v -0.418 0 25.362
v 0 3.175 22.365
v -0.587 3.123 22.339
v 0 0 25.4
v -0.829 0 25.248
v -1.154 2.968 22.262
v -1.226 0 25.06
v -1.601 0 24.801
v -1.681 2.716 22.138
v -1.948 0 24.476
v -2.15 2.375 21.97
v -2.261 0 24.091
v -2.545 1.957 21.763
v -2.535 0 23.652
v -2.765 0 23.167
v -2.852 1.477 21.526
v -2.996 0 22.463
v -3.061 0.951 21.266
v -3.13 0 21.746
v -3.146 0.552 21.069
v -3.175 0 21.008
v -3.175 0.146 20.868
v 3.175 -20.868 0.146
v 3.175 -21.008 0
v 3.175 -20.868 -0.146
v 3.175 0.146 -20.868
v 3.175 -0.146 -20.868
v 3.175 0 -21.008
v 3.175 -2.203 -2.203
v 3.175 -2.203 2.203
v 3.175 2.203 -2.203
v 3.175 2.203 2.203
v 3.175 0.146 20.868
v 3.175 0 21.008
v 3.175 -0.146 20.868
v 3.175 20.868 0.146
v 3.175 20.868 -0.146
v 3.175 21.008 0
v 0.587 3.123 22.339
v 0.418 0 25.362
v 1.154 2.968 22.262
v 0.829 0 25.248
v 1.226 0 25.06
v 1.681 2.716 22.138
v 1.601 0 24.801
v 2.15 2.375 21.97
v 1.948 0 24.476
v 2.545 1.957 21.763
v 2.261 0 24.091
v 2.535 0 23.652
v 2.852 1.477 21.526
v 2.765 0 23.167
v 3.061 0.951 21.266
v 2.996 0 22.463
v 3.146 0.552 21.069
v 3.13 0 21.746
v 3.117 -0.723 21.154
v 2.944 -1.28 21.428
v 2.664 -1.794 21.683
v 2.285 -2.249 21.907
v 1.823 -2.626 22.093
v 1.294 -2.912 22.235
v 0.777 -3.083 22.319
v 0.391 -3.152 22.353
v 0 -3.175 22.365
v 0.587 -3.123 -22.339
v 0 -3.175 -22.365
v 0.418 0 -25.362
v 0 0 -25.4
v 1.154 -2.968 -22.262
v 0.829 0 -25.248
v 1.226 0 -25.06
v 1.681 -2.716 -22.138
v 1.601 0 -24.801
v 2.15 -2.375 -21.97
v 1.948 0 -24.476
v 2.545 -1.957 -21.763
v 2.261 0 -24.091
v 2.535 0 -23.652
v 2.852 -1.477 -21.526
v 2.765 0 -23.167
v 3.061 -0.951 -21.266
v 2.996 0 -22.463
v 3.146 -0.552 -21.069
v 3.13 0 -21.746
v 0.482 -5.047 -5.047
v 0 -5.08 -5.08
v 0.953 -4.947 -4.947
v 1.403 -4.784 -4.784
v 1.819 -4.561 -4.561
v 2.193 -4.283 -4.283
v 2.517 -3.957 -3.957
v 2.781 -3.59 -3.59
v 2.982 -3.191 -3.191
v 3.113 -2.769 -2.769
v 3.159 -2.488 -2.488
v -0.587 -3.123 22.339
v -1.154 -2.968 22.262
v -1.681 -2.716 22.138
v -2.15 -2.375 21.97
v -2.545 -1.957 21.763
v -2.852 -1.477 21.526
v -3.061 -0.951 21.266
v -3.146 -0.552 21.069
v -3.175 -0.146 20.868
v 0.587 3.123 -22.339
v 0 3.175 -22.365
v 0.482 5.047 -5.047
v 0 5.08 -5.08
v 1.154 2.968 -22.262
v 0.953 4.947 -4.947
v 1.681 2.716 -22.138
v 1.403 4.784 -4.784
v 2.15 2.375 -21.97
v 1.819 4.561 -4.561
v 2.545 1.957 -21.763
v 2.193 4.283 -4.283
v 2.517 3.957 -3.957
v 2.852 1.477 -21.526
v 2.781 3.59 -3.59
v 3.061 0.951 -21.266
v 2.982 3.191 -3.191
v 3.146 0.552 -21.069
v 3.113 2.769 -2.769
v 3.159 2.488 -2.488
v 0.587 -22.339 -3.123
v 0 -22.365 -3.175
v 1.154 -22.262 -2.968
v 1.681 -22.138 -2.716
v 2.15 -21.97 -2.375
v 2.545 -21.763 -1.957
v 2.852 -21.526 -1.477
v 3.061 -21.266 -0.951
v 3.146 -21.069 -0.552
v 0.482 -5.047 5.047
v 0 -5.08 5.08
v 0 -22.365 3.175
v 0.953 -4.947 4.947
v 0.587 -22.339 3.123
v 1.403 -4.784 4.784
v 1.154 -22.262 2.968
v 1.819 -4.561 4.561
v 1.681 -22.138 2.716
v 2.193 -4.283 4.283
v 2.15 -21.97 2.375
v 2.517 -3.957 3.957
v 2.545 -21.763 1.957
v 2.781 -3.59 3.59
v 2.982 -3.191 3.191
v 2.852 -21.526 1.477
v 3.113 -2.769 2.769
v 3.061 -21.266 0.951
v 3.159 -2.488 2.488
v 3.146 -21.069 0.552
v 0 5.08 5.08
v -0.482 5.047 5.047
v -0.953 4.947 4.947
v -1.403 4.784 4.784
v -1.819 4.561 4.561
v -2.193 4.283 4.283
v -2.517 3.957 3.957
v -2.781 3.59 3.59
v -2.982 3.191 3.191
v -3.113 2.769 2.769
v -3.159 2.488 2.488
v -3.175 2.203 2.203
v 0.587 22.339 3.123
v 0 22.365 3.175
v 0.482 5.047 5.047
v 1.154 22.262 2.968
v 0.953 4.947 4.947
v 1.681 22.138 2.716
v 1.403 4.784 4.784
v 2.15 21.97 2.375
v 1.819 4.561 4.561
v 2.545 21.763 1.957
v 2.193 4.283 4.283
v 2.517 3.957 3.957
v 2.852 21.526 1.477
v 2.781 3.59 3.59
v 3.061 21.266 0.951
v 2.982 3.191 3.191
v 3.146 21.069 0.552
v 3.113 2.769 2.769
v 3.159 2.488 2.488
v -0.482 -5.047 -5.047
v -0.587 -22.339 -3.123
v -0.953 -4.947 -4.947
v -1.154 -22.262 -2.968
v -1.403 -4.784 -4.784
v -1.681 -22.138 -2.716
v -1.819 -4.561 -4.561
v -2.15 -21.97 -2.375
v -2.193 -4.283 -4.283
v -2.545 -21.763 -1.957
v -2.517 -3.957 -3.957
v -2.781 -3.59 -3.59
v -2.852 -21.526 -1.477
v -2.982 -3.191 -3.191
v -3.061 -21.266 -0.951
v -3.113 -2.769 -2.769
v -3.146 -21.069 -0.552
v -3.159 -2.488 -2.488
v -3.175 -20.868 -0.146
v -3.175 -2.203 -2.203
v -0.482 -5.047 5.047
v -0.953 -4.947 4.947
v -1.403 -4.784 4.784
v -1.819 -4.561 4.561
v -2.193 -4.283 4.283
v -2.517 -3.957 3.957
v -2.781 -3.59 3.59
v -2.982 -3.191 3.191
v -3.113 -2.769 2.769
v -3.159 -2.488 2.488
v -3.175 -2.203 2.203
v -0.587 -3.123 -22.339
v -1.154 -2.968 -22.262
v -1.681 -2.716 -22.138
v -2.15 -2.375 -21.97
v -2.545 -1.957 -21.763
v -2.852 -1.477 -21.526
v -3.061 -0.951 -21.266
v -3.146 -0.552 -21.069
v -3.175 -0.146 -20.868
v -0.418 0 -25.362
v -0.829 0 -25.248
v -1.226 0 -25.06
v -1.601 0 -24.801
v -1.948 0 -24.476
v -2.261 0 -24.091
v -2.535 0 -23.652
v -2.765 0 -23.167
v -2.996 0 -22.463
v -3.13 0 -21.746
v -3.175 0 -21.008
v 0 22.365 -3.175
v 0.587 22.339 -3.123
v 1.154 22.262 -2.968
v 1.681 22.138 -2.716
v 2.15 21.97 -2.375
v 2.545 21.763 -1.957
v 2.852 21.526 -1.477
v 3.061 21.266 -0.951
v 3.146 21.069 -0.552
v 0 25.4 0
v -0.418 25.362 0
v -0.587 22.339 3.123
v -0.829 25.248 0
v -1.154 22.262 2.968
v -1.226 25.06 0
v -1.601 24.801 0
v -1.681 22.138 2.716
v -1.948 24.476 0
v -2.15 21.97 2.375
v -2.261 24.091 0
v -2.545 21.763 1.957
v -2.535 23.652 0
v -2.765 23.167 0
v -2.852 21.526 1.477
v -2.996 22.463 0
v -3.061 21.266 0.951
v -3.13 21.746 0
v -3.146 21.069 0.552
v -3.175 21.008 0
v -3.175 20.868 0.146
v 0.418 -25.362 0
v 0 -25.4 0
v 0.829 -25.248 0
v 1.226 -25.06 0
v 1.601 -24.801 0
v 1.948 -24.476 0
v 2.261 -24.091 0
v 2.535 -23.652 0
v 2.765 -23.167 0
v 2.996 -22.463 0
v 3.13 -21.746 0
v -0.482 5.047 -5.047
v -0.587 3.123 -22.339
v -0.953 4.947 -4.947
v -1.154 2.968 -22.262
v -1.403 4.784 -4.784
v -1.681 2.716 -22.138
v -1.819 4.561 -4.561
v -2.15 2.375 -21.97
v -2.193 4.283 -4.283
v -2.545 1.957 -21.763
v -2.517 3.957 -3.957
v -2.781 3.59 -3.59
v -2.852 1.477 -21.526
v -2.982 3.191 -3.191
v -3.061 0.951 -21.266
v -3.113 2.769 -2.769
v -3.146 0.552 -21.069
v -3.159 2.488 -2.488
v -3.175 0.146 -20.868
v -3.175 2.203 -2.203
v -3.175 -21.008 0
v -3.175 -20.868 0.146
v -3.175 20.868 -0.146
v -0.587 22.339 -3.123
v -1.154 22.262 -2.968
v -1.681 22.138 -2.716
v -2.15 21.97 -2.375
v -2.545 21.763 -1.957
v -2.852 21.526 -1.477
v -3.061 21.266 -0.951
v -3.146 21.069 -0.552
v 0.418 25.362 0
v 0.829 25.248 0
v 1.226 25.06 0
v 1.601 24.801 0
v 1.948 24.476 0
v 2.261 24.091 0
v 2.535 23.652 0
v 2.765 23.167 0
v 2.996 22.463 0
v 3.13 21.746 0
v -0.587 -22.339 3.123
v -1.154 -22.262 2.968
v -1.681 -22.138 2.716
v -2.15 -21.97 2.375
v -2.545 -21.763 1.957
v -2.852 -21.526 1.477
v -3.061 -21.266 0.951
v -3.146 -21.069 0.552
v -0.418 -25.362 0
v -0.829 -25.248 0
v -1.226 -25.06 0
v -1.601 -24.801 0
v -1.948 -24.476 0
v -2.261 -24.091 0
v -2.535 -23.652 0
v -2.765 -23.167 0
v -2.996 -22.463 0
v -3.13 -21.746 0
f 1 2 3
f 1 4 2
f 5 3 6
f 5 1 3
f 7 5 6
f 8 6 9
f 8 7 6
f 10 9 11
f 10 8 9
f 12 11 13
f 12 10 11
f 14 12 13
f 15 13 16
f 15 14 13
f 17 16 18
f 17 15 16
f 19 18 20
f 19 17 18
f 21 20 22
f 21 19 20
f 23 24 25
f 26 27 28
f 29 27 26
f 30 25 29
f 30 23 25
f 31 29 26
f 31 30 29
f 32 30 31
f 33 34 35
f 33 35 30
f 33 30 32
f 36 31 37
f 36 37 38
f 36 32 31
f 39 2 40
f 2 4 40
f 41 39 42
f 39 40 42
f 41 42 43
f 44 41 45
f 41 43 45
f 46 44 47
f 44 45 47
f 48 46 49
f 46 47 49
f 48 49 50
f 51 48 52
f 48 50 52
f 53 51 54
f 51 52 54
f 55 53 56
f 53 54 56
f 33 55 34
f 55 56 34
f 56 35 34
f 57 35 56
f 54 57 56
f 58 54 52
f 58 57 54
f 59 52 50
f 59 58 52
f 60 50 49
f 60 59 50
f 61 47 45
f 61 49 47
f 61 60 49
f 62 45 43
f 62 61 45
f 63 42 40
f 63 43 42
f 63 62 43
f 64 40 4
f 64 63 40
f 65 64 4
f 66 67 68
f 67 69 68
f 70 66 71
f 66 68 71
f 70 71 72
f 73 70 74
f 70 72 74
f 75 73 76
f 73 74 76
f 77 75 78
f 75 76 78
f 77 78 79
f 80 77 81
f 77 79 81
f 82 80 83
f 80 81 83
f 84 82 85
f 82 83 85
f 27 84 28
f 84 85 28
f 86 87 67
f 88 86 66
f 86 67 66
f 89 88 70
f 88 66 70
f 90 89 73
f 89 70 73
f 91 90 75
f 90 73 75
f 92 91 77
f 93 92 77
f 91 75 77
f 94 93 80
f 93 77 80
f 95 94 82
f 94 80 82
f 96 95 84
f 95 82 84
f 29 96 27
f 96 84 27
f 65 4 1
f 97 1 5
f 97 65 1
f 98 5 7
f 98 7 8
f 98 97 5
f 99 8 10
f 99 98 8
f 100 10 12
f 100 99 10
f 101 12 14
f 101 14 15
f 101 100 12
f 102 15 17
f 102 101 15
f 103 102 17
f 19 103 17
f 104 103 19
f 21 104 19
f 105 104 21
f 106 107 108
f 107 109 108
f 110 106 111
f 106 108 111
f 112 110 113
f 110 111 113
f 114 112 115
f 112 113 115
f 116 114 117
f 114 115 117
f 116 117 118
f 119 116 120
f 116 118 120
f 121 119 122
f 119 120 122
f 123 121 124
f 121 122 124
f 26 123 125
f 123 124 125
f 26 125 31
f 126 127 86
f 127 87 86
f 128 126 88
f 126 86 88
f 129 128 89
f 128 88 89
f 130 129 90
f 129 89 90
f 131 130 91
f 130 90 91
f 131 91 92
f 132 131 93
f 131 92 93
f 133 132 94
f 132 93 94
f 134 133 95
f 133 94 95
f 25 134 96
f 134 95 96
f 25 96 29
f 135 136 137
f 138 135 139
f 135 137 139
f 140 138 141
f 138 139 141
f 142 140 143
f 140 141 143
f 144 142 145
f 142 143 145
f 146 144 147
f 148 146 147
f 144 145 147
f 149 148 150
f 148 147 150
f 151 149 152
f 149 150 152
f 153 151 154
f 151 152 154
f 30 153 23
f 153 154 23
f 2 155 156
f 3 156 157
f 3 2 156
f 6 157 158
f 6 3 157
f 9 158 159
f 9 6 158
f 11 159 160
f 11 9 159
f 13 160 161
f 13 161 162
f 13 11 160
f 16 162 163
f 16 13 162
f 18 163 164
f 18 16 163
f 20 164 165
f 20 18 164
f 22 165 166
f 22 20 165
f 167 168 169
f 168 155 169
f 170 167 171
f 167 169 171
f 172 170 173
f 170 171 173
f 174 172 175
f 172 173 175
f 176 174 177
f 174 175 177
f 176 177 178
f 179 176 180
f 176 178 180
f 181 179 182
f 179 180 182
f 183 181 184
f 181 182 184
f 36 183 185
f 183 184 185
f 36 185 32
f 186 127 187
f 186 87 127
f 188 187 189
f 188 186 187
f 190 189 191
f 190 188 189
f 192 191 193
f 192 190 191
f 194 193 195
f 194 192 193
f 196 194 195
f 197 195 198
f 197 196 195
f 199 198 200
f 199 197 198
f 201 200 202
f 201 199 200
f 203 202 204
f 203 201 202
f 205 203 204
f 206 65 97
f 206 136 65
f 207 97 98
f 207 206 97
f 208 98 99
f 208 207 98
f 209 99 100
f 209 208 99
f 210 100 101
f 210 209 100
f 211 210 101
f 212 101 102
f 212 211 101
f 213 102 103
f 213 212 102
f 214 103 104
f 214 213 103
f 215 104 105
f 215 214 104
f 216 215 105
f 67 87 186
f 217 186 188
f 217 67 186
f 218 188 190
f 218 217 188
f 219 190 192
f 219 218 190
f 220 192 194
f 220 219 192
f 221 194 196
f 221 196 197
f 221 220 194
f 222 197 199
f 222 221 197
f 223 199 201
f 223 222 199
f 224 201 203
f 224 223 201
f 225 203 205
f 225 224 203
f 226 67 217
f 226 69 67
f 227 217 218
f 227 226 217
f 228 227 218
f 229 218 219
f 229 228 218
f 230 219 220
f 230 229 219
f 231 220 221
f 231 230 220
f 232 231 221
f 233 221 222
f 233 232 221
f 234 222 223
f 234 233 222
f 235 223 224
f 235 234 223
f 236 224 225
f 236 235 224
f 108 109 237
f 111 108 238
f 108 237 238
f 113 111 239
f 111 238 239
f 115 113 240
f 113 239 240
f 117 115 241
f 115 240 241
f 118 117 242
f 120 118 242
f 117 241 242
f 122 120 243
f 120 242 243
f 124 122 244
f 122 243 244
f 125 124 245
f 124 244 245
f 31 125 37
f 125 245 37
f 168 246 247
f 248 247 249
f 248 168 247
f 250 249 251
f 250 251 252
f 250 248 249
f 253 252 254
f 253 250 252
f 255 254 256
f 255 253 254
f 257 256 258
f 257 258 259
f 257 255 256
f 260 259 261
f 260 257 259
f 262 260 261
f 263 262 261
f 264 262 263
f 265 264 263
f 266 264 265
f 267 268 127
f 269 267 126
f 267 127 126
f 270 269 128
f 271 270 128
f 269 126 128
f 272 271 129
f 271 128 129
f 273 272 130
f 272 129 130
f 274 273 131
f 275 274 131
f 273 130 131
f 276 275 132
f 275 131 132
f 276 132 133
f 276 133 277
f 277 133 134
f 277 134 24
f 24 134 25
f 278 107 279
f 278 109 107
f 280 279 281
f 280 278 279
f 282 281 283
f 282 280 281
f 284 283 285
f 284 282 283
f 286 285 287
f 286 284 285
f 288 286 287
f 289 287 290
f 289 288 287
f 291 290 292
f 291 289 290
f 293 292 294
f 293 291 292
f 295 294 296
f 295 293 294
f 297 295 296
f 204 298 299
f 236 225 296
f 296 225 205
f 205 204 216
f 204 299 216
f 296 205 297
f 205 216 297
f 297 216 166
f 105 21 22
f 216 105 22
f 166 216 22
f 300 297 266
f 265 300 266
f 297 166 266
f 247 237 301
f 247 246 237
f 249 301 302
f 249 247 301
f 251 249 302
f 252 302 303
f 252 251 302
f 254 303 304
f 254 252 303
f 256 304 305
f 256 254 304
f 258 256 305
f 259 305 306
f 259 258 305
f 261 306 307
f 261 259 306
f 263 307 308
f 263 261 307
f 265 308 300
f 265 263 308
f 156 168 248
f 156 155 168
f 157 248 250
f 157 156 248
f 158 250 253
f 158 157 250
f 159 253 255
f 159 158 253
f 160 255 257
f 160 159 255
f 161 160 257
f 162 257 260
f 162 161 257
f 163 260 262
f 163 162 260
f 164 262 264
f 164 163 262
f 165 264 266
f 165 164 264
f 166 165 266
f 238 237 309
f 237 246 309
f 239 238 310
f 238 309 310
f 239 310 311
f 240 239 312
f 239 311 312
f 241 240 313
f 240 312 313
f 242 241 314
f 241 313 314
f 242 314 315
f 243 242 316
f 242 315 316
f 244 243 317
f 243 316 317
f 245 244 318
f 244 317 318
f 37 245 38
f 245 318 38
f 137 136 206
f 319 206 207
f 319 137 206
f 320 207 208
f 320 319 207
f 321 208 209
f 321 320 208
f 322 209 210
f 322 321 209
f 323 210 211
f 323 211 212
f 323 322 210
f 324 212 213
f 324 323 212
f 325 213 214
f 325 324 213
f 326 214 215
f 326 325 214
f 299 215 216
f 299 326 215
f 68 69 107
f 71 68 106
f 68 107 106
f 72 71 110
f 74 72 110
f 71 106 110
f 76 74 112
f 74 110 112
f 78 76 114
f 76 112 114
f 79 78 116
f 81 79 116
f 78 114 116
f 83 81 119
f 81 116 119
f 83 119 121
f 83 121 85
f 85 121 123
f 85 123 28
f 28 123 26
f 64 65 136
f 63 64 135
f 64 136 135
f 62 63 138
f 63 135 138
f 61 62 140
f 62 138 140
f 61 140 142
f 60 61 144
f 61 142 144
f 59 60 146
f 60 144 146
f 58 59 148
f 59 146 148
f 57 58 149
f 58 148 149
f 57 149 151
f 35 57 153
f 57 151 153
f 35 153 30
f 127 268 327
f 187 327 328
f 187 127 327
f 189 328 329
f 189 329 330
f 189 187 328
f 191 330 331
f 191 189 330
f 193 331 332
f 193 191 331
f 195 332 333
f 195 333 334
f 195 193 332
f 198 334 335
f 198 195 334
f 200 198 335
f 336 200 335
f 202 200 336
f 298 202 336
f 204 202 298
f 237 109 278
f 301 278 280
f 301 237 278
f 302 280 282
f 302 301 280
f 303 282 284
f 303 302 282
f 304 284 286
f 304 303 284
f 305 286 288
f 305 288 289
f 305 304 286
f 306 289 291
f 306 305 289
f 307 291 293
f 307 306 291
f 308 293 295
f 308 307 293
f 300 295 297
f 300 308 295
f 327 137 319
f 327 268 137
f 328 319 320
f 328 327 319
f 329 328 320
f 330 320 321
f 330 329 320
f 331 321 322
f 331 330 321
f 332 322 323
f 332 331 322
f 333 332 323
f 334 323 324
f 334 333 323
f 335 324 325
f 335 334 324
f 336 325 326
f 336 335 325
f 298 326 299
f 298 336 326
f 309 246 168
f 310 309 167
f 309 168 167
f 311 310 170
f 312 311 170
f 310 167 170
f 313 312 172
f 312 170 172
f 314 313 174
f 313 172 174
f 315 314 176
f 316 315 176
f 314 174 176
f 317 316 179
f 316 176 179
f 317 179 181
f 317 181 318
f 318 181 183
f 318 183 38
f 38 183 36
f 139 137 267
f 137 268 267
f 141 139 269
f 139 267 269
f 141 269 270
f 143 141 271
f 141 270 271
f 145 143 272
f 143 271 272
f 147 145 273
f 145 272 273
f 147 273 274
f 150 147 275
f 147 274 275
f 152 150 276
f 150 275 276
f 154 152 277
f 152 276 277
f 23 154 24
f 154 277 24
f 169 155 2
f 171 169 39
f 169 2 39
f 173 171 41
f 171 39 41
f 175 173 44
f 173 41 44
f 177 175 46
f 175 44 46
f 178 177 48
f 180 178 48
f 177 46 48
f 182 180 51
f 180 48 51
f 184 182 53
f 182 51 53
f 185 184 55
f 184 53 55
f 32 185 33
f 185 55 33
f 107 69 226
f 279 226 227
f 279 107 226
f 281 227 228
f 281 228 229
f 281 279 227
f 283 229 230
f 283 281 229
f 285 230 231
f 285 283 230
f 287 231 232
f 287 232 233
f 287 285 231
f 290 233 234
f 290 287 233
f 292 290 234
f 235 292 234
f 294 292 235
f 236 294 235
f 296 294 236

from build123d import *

# Parameters (mm, degrees)
F1_DEPTH = 3.175
F2_R     = 3.17499


# Not quite as in the source:
# - a fillet or chamfer is up to 0.001 mm smaller than in the source, because OpenCascade refuses the exact size


with BuildPart() as f1:
    # F0 (on Right) → F1 (new body, symmetric)
    with BuildSketch(Plane.YZ):
        Polygon((3.175, 22.364773135), (0, 25.4), (-3.175, 22.364773135), (-5.08, 5.08), (-22.364773135, 3.175), (-25.4, 0), (-22.364773135, -3.175), (-5.08, -5.08), (-3.175, -22.364773135), (0, -25.4), (3.175, -22.364773135), (5.08, -5.08), (22.364773135, -3.175), (25.4, 0), (22.364773135, 3.175), (5.08, 5.08), align=None)
    extrude(amount=F1_DEPTH, both=True)

    # F2 (radius 3.175 in the source; OpenCascade refuses exactly that, so slightly less here)
    f2_edges = [f1.edges().sort_by_distance(p)[0] for p in [
        (3.175, 4.1275, 13.722387),
        (3.175, 1.5875, 23.882387),
        (3.175, -1.5875, 23.882387),
        (3.175, -4.1275, 13.722387),
        (3.175, -13.722387, 4.1275),
        (3.175, -23.882387, 1.5875),
        (3.175, -23.882387, -1.5875),
        (3.175, -13.722387, -4.1275),
        (3.175, -4.1275, -13.722387),
        (3.175, -1.5875, -23.882387),
        (3.175, 1.5875, -23.882387),
        (3.175, 4.1275, -13.722387),
        (3.175, 13.722387, -4.1275),
        (3.175, 23.882387, -1.5875),
        (3.175, 23.882387, 1.5875),
        (3.175, 13.722387, 4.1275),
        (-3.175, 4.1275, 13.722387),
        (-3.175, 1.5875, 23.882387),
        (-3.175, -1.5875, 23.882387),
        (-3.175, -4.1275, 13.722387),
        (-3.175, -13.722387, 4.1275),
        (-3.175, -23.882387, 1.5875),
        (-3.175, -23.882387, -1.5875),
        (-3.175, -13.722387, -4.1275),
        (-3.175, -4.1275, -13.722387),
        (-3.175, -1.5875, -23.882387),
        (-3.175, 1.5875, -23.882387),
        (-3.175, 4.1275, -13.722387),
        (-3.175, 13.722387, -4.1275),
        (-3.175, 23.882387, -1.5875),
        (-3.175, 23.882387, 1.5875),
        (-3.175, 13.722387, 4.1275),
    ]]
    fillet(f2_edges, radius=F2_R)


solid = f1.part
